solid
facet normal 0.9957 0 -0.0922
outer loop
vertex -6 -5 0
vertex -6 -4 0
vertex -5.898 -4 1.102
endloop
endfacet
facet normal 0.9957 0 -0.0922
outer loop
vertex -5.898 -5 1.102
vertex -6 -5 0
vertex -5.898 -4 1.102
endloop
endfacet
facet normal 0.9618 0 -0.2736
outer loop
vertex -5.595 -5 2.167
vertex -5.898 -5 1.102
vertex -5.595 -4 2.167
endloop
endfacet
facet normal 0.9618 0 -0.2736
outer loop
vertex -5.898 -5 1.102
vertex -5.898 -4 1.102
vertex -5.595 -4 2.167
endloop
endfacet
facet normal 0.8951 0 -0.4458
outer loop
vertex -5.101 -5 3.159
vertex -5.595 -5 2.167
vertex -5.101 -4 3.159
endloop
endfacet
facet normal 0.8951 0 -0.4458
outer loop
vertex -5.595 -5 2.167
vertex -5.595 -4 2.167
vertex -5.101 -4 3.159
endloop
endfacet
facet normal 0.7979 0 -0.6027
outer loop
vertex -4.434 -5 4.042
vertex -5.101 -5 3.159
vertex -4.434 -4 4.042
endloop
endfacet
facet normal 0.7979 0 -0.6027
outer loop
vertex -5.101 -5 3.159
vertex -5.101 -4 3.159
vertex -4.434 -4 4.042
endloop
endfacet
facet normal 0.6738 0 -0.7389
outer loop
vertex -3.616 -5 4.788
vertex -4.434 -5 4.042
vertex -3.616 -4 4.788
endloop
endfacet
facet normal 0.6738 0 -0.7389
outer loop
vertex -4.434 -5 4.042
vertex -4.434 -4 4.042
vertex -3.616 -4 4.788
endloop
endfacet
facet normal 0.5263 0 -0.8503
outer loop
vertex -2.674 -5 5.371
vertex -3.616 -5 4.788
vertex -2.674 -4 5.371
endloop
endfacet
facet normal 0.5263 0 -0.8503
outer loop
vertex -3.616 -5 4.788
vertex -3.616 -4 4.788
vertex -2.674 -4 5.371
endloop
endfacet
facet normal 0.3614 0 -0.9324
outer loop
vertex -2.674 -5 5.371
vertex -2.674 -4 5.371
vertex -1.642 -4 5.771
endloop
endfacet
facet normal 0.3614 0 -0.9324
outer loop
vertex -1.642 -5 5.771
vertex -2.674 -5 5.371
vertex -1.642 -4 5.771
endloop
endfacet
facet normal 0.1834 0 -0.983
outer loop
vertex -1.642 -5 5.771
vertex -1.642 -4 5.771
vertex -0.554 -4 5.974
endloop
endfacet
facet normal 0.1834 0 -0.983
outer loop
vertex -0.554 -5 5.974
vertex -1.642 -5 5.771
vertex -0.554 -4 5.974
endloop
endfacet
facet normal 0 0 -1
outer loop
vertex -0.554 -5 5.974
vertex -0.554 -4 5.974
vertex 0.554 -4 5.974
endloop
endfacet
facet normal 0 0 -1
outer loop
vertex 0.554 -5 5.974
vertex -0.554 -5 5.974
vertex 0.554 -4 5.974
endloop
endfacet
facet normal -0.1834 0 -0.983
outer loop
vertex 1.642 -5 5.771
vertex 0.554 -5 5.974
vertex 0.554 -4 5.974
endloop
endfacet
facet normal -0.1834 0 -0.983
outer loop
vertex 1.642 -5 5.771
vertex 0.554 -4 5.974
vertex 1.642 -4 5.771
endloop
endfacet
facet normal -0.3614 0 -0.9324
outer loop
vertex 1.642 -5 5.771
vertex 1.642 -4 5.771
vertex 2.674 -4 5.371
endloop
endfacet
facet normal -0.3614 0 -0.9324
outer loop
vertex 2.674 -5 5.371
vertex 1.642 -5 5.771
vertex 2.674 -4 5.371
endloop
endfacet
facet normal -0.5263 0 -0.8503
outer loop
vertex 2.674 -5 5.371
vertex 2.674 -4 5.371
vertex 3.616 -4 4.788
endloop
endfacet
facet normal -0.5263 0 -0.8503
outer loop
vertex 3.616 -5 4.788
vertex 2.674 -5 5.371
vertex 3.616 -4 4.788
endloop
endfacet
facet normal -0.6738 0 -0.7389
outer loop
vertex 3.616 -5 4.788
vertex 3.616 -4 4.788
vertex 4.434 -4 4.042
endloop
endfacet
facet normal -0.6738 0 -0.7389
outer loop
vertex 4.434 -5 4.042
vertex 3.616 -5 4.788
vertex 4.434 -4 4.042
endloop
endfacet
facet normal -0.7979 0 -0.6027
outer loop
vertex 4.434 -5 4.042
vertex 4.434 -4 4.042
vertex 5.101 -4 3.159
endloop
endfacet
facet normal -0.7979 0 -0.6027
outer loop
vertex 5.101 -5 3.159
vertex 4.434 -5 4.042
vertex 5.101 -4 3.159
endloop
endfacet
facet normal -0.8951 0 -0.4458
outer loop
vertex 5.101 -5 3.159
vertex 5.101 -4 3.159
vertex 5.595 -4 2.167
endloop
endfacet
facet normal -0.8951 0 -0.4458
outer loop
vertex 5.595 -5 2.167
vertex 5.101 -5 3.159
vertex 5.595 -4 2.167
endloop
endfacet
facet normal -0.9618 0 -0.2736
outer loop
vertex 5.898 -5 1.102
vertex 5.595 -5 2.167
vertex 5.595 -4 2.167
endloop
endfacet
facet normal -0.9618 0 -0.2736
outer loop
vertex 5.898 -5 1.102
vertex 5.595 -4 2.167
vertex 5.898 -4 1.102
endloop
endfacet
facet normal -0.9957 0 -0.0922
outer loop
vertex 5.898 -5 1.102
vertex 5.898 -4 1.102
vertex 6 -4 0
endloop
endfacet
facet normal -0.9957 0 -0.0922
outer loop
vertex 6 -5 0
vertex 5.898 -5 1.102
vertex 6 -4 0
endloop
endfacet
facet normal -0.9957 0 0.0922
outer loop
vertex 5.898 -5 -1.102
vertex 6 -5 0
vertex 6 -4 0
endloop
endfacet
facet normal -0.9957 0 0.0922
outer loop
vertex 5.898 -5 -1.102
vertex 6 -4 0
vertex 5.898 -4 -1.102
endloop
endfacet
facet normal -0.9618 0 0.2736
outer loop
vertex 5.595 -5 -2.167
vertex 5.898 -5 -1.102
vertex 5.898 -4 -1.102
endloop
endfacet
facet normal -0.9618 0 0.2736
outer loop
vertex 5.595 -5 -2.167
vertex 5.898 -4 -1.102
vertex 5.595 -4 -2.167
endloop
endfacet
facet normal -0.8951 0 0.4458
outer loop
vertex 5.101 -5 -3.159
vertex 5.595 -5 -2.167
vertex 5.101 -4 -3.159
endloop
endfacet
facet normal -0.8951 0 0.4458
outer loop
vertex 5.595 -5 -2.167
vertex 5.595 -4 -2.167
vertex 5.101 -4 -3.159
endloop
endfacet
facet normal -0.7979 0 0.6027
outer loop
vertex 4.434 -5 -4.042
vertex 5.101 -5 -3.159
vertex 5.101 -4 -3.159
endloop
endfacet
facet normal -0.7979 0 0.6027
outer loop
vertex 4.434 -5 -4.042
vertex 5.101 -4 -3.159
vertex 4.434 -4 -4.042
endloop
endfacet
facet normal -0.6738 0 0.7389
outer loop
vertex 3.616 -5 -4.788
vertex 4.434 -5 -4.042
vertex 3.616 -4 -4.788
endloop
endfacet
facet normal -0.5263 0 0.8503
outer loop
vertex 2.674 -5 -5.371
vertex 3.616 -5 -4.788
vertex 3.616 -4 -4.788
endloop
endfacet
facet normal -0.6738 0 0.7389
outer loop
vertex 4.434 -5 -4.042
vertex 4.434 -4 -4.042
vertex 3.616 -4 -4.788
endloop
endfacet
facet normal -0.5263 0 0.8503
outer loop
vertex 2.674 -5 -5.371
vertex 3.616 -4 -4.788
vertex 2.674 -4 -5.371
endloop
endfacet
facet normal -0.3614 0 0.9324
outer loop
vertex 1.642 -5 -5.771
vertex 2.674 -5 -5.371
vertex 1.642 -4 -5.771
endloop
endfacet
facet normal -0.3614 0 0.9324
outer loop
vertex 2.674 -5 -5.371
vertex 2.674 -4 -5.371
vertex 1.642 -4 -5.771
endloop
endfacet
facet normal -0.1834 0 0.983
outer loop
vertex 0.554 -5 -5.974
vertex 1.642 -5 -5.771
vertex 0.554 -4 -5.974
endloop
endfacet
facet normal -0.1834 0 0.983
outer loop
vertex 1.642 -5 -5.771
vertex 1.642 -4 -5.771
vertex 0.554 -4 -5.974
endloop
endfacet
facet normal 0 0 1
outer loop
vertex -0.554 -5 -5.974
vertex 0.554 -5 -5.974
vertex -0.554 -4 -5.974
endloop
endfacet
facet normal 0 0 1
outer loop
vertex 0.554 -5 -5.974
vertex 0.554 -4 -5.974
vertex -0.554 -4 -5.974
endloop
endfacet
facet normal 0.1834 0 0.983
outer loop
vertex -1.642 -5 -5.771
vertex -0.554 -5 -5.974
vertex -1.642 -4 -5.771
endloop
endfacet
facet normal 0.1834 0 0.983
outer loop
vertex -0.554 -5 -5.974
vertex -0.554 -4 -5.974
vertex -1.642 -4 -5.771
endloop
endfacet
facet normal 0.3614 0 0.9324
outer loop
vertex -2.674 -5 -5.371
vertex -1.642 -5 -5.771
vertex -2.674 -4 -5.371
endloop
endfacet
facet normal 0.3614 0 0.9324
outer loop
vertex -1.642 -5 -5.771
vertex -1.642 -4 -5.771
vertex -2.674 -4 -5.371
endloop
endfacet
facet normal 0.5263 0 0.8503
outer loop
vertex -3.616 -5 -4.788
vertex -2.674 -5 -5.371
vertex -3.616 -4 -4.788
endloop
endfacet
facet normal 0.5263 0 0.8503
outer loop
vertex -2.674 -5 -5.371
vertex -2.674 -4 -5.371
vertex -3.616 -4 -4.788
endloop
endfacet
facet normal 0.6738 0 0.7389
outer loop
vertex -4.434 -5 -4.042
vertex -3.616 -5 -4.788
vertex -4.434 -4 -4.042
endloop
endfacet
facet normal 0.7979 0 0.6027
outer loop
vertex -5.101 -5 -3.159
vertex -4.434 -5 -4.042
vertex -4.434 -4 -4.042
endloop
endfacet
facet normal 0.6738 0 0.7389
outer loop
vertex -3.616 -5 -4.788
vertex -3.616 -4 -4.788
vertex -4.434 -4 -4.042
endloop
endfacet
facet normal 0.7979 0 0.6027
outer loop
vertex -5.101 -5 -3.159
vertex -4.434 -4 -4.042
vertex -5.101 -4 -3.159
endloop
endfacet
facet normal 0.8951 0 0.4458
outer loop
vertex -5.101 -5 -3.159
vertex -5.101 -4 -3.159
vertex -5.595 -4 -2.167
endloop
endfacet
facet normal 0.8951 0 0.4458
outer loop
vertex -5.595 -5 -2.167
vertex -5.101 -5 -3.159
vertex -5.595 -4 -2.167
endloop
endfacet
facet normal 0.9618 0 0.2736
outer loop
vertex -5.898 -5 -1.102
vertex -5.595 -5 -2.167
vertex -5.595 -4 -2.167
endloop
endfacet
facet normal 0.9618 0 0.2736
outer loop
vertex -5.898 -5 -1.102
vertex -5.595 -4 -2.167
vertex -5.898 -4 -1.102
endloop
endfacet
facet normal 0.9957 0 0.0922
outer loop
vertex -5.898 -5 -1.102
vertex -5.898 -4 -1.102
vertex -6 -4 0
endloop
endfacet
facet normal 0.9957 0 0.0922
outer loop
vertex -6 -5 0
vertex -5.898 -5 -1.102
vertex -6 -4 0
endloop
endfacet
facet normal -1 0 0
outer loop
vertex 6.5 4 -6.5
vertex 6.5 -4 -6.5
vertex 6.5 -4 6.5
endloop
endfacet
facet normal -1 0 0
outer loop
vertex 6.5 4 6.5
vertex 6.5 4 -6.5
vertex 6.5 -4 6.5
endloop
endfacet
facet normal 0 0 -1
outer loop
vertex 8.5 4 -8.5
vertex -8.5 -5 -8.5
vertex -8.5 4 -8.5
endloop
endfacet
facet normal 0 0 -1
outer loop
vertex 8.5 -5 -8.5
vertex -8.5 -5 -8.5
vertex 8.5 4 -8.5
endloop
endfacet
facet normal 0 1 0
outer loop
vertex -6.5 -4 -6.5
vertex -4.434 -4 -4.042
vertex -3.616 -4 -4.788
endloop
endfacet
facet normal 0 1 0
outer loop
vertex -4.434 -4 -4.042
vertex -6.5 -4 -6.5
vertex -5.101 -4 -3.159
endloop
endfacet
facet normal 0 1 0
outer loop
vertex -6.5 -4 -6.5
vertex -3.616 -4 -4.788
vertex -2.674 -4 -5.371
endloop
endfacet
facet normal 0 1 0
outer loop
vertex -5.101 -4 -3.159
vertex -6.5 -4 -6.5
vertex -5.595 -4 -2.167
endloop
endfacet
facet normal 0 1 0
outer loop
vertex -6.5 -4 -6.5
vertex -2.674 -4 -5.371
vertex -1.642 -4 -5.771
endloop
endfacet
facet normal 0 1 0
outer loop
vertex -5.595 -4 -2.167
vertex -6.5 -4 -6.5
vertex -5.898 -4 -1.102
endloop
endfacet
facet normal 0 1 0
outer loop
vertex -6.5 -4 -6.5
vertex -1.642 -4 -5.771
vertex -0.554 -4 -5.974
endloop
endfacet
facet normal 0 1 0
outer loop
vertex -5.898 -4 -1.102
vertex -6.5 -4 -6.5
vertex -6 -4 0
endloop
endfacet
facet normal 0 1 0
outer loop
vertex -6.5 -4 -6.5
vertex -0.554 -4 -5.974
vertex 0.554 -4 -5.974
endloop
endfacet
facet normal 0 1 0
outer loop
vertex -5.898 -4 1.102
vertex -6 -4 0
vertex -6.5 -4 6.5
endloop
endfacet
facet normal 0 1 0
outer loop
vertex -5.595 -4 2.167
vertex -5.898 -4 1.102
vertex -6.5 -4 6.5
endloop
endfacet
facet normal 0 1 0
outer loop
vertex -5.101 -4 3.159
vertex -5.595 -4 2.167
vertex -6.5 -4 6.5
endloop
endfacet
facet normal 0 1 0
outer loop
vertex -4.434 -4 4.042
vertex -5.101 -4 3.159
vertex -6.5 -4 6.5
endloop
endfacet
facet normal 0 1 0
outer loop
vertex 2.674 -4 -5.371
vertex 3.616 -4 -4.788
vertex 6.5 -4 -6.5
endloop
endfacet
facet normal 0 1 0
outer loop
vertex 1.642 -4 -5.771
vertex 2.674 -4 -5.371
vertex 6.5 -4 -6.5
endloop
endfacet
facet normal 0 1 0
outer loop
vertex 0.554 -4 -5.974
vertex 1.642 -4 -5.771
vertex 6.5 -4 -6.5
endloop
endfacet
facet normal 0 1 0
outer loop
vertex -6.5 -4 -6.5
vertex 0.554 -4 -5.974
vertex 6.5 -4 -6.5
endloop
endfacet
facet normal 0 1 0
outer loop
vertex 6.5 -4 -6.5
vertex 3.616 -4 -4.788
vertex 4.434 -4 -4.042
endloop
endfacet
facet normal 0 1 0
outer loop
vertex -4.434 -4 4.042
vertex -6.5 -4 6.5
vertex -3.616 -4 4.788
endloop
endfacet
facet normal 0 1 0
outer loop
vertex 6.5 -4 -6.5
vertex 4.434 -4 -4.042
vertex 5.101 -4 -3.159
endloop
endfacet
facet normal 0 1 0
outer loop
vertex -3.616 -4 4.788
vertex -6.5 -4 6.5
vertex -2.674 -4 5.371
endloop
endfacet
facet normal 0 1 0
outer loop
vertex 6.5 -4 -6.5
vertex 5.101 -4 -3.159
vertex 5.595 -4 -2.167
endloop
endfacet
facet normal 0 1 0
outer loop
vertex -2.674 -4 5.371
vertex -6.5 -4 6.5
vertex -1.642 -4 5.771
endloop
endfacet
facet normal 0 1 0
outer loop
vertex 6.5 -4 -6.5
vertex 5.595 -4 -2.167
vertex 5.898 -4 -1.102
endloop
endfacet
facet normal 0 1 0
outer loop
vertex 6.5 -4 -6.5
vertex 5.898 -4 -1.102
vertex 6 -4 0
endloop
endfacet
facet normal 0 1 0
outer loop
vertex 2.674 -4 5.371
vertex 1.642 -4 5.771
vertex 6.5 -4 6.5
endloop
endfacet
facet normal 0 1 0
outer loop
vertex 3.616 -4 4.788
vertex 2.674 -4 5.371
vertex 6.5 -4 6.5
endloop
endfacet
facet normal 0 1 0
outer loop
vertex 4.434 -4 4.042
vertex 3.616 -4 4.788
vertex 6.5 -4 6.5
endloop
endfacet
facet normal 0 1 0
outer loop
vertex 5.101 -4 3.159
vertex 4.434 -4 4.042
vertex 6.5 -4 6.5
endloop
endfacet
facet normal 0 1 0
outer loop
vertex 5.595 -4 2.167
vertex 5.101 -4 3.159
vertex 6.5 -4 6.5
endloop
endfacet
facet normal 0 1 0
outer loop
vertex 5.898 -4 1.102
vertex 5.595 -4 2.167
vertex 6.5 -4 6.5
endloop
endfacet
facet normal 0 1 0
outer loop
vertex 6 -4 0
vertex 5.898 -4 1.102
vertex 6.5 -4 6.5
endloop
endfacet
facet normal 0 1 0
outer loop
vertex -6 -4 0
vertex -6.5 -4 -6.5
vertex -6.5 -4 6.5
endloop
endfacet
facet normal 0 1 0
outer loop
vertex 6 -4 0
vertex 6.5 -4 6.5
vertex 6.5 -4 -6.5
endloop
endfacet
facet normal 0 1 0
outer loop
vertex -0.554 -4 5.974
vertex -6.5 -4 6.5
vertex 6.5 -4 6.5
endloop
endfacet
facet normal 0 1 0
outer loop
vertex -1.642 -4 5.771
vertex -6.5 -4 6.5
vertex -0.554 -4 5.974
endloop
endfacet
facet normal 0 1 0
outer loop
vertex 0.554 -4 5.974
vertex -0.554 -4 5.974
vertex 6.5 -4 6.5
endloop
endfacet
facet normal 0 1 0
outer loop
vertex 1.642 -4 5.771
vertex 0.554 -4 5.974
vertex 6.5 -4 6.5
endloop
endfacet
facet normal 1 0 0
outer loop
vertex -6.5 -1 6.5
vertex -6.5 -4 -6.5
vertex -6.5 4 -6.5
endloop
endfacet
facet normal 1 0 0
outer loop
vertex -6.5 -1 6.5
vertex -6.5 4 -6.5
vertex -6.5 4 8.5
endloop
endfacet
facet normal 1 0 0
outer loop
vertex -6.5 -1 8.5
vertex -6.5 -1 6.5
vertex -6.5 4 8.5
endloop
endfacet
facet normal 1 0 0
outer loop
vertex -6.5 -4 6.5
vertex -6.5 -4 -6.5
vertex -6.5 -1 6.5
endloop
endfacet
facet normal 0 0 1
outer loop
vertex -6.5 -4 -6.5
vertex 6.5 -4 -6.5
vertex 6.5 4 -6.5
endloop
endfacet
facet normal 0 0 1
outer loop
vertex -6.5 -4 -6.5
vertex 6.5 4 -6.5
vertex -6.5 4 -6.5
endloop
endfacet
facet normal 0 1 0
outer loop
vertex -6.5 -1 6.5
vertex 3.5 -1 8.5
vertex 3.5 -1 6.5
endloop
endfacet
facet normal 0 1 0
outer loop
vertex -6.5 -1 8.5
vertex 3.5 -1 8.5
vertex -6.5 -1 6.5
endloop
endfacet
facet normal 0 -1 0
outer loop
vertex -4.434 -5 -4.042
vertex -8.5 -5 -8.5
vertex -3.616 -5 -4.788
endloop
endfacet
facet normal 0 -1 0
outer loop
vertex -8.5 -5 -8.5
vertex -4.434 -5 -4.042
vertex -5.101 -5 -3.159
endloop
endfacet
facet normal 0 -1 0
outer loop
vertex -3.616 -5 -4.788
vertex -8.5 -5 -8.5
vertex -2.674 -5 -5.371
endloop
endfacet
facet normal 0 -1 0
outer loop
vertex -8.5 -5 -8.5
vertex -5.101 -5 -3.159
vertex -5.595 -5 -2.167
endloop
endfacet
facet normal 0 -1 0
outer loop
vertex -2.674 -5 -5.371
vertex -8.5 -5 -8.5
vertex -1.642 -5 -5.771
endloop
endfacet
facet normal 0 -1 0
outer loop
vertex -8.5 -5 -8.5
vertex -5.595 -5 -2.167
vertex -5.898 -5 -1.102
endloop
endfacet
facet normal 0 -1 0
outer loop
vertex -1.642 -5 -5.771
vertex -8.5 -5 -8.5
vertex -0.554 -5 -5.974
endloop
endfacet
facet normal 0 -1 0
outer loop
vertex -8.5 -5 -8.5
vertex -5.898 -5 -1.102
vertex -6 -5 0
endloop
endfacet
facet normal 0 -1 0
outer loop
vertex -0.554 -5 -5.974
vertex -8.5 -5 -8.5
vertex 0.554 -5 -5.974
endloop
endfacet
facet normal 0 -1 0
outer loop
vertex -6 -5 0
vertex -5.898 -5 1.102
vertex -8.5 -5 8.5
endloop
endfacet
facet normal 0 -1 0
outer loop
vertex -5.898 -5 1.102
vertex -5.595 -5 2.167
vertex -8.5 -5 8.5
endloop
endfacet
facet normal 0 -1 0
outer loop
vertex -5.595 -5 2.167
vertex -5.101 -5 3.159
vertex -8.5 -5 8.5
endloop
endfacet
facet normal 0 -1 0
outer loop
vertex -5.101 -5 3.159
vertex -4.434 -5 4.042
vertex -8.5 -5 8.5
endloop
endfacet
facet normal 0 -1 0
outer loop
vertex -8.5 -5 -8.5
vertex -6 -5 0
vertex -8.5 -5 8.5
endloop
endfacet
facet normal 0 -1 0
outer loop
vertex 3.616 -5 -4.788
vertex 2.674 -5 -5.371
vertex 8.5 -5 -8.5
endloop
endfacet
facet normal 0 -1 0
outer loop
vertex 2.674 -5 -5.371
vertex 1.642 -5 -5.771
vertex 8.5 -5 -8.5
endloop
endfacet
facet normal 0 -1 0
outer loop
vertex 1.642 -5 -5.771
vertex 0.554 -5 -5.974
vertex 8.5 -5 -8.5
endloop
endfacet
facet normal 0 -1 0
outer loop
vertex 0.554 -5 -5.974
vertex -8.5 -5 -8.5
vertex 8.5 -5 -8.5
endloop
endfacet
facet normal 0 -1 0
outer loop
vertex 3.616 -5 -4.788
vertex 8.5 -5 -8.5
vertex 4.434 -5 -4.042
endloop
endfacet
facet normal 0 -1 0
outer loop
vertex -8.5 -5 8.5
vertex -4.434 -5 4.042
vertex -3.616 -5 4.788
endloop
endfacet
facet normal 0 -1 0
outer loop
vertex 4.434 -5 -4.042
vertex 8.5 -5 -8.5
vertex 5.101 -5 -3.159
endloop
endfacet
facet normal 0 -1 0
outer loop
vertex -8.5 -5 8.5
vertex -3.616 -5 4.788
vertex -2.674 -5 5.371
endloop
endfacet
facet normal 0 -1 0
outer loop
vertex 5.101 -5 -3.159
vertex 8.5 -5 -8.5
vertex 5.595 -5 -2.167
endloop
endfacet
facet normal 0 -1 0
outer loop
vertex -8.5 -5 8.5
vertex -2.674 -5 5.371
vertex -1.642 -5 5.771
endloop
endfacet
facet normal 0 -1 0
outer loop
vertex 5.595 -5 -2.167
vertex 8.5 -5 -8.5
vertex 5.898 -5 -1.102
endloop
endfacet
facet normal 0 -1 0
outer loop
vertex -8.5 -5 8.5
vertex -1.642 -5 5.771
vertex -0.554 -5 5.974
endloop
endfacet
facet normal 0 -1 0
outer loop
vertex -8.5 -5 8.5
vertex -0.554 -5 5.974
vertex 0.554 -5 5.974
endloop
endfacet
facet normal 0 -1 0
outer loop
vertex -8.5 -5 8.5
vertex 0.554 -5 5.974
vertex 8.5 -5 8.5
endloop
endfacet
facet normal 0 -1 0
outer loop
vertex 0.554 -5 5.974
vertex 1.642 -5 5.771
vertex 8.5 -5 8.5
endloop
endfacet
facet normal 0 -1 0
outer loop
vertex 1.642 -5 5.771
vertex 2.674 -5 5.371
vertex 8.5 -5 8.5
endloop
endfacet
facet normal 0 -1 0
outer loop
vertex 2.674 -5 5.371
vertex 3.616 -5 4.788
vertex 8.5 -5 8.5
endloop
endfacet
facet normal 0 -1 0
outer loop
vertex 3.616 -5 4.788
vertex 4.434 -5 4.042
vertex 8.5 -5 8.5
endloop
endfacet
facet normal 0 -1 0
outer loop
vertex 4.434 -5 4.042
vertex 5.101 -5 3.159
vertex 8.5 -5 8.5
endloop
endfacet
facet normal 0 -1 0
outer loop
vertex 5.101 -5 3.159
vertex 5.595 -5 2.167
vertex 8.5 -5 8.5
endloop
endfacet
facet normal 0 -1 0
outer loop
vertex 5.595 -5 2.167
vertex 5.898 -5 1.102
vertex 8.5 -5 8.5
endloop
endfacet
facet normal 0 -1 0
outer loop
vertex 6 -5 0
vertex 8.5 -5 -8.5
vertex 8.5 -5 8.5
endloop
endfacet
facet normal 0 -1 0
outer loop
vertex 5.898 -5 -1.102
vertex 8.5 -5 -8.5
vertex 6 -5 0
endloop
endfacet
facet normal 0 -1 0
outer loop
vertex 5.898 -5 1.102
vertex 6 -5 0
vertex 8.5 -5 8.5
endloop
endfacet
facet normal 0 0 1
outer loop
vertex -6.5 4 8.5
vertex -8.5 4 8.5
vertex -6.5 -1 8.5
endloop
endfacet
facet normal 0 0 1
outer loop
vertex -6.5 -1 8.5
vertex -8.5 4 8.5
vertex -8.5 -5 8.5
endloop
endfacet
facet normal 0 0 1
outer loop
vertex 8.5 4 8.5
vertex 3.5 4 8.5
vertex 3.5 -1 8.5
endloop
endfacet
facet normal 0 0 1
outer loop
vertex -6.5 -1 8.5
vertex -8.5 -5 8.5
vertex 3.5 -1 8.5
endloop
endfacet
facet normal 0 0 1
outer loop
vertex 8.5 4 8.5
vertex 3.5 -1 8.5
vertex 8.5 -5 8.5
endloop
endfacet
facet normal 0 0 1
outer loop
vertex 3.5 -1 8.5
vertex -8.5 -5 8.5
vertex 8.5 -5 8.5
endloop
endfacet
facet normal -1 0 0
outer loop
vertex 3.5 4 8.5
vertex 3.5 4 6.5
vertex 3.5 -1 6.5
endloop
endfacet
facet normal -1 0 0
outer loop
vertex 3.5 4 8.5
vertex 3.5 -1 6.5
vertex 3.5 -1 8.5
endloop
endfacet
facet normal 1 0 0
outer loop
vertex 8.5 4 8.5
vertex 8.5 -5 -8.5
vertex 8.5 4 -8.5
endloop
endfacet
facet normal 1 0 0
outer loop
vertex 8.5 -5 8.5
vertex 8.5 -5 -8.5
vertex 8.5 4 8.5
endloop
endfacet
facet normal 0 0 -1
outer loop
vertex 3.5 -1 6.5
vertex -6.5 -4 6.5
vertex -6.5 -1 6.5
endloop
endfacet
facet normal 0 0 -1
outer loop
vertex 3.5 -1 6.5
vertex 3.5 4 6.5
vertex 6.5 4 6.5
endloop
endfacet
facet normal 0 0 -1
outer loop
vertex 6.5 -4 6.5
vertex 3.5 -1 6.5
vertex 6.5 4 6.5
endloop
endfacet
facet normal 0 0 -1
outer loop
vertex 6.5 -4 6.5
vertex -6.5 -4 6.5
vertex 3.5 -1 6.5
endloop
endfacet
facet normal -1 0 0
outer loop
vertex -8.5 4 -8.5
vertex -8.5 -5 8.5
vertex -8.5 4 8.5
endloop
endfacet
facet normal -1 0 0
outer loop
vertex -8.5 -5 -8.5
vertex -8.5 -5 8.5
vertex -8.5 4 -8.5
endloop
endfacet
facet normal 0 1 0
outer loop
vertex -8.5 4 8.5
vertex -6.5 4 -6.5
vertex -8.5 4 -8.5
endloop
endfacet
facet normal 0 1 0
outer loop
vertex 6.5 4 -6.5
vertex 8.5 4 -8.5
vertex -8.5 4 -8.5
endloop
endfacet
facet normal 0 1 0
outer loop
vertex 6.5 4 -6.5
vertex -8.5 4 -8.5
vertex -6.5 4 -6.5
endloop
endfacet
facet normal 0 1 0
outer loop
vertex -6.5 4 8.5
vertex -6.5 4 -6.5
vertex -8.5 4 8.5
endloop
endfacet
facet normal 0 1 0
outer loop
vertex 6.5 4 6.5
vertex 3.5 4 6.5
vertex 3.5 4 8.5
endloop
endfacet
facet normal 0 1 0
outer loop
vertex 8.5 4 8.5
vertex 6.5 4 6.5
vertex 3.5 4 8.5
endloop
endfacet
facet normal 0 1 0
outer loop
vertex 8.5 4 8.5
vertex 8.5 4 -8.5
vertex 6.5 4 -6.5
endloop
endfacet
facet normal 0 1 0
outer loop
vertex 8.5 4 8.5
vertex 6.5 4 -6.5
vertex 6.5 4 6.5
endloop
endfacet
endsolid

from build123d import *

# Parameters (mm, degrees)
F0_W      = 13
F0_H      = 13
F1_DEPTH  = 5
F2_R      = 6
F3_DEPTH  = 25
F4_W      = 13
F4_H      = 1
F5_DEPTH  = 2
F6_W      = 1
F6_H      = 17
F7_DEPTH  = 2
F8_W      = 1
F8_H      = 15
F9_DEPTH  = 2
F10_DEPTH = 15
F11_DEPTH = 8
F12_DEPTH = 4
F13_W     = 10
F13_H     = 2
F14_DEPTH = 5


with BuildPart() as f1:
    # F0 (on Front) → F1 (new body)
    with BuildSketch(Plane.XZ):
        Rectangle(F0_W, F0_H)
    extrude(amount=F1_DEPTH)

    # F2 (on face) → F3 (cut)
    with BuildSketch(Plane(origin=(0, 0, 0), x_dir=(-1, 0, 0), z_dir=(0, 1, 0))):
        Circle(F2_R)
    extrude(amount=-F3_DEPTH, mode=Mode.SUBTRACT)

    # F4 (on face) → F5 (join)
    with BuildSketch(Plane.XY.offset(6.5)):
        with Locations((0, -4.5)):
            Rectangle(F4_W, F4_H)
    extrude(amount=F5_DEPTH)

    # F6 (on face) → F7 (join)
    with BuildSketch(Plane.YZ.offset(6.5)):
        with Locations((-4.5, 0)):
            Rectangle(F6_W, F6_H)
    extrude(amount=F7_DEPTH)

    # F8 (on face) → F9 (join)
    with BuildSketch(Plane(origin=(-6.5, 0, 0), x_dir=(0, -1, 0), z_dir=(-1, 0, 0))):
        with Locations((4.5, 1)):
            Rectangle(F8_W, F8_H)
    extrude(amount=F9_DEPTH)

    # F10 (add): a face of the model
    f10_faces = [f1.faces().sort_by_distance(p)[0] for p in [
        (6.5, -4.5, -7.5),
    ]]
    extrude(f10_faces, amount=F10_DEPTH)

    # F11 (add): a face of the model
    f11_faces = [f1.faces().sort_by_distance(p)[0] for p in [
        (0, -4, -8.2595836944),
    ]]
    extrude(f11_faces, amount=F11_DEPTH)

    # F12 (cut): a face of the model
    f12_faces = [f1.faces().sort_by_distance(p)[0] for p in [
        (6.3161522369, 0, 0),
    ]]
    extrude(f12_faces, amount=-F12_DEPTH, mode=Mode.SUBTRACT)

    # F13 (on face) → F14 (cut)
    with BuildSketch(Plane(origin=(0, 4, 0), x_dir=(-1, 0, 0), z_dir=(0, 1, 0))):
        with Locations((1.5, 7.5)):
            Rectangle(F13_W, F13_H)
    extrude(amount=-F14_DEPTH, mode=Mode.SUBTRACT)


solid = f1.part
